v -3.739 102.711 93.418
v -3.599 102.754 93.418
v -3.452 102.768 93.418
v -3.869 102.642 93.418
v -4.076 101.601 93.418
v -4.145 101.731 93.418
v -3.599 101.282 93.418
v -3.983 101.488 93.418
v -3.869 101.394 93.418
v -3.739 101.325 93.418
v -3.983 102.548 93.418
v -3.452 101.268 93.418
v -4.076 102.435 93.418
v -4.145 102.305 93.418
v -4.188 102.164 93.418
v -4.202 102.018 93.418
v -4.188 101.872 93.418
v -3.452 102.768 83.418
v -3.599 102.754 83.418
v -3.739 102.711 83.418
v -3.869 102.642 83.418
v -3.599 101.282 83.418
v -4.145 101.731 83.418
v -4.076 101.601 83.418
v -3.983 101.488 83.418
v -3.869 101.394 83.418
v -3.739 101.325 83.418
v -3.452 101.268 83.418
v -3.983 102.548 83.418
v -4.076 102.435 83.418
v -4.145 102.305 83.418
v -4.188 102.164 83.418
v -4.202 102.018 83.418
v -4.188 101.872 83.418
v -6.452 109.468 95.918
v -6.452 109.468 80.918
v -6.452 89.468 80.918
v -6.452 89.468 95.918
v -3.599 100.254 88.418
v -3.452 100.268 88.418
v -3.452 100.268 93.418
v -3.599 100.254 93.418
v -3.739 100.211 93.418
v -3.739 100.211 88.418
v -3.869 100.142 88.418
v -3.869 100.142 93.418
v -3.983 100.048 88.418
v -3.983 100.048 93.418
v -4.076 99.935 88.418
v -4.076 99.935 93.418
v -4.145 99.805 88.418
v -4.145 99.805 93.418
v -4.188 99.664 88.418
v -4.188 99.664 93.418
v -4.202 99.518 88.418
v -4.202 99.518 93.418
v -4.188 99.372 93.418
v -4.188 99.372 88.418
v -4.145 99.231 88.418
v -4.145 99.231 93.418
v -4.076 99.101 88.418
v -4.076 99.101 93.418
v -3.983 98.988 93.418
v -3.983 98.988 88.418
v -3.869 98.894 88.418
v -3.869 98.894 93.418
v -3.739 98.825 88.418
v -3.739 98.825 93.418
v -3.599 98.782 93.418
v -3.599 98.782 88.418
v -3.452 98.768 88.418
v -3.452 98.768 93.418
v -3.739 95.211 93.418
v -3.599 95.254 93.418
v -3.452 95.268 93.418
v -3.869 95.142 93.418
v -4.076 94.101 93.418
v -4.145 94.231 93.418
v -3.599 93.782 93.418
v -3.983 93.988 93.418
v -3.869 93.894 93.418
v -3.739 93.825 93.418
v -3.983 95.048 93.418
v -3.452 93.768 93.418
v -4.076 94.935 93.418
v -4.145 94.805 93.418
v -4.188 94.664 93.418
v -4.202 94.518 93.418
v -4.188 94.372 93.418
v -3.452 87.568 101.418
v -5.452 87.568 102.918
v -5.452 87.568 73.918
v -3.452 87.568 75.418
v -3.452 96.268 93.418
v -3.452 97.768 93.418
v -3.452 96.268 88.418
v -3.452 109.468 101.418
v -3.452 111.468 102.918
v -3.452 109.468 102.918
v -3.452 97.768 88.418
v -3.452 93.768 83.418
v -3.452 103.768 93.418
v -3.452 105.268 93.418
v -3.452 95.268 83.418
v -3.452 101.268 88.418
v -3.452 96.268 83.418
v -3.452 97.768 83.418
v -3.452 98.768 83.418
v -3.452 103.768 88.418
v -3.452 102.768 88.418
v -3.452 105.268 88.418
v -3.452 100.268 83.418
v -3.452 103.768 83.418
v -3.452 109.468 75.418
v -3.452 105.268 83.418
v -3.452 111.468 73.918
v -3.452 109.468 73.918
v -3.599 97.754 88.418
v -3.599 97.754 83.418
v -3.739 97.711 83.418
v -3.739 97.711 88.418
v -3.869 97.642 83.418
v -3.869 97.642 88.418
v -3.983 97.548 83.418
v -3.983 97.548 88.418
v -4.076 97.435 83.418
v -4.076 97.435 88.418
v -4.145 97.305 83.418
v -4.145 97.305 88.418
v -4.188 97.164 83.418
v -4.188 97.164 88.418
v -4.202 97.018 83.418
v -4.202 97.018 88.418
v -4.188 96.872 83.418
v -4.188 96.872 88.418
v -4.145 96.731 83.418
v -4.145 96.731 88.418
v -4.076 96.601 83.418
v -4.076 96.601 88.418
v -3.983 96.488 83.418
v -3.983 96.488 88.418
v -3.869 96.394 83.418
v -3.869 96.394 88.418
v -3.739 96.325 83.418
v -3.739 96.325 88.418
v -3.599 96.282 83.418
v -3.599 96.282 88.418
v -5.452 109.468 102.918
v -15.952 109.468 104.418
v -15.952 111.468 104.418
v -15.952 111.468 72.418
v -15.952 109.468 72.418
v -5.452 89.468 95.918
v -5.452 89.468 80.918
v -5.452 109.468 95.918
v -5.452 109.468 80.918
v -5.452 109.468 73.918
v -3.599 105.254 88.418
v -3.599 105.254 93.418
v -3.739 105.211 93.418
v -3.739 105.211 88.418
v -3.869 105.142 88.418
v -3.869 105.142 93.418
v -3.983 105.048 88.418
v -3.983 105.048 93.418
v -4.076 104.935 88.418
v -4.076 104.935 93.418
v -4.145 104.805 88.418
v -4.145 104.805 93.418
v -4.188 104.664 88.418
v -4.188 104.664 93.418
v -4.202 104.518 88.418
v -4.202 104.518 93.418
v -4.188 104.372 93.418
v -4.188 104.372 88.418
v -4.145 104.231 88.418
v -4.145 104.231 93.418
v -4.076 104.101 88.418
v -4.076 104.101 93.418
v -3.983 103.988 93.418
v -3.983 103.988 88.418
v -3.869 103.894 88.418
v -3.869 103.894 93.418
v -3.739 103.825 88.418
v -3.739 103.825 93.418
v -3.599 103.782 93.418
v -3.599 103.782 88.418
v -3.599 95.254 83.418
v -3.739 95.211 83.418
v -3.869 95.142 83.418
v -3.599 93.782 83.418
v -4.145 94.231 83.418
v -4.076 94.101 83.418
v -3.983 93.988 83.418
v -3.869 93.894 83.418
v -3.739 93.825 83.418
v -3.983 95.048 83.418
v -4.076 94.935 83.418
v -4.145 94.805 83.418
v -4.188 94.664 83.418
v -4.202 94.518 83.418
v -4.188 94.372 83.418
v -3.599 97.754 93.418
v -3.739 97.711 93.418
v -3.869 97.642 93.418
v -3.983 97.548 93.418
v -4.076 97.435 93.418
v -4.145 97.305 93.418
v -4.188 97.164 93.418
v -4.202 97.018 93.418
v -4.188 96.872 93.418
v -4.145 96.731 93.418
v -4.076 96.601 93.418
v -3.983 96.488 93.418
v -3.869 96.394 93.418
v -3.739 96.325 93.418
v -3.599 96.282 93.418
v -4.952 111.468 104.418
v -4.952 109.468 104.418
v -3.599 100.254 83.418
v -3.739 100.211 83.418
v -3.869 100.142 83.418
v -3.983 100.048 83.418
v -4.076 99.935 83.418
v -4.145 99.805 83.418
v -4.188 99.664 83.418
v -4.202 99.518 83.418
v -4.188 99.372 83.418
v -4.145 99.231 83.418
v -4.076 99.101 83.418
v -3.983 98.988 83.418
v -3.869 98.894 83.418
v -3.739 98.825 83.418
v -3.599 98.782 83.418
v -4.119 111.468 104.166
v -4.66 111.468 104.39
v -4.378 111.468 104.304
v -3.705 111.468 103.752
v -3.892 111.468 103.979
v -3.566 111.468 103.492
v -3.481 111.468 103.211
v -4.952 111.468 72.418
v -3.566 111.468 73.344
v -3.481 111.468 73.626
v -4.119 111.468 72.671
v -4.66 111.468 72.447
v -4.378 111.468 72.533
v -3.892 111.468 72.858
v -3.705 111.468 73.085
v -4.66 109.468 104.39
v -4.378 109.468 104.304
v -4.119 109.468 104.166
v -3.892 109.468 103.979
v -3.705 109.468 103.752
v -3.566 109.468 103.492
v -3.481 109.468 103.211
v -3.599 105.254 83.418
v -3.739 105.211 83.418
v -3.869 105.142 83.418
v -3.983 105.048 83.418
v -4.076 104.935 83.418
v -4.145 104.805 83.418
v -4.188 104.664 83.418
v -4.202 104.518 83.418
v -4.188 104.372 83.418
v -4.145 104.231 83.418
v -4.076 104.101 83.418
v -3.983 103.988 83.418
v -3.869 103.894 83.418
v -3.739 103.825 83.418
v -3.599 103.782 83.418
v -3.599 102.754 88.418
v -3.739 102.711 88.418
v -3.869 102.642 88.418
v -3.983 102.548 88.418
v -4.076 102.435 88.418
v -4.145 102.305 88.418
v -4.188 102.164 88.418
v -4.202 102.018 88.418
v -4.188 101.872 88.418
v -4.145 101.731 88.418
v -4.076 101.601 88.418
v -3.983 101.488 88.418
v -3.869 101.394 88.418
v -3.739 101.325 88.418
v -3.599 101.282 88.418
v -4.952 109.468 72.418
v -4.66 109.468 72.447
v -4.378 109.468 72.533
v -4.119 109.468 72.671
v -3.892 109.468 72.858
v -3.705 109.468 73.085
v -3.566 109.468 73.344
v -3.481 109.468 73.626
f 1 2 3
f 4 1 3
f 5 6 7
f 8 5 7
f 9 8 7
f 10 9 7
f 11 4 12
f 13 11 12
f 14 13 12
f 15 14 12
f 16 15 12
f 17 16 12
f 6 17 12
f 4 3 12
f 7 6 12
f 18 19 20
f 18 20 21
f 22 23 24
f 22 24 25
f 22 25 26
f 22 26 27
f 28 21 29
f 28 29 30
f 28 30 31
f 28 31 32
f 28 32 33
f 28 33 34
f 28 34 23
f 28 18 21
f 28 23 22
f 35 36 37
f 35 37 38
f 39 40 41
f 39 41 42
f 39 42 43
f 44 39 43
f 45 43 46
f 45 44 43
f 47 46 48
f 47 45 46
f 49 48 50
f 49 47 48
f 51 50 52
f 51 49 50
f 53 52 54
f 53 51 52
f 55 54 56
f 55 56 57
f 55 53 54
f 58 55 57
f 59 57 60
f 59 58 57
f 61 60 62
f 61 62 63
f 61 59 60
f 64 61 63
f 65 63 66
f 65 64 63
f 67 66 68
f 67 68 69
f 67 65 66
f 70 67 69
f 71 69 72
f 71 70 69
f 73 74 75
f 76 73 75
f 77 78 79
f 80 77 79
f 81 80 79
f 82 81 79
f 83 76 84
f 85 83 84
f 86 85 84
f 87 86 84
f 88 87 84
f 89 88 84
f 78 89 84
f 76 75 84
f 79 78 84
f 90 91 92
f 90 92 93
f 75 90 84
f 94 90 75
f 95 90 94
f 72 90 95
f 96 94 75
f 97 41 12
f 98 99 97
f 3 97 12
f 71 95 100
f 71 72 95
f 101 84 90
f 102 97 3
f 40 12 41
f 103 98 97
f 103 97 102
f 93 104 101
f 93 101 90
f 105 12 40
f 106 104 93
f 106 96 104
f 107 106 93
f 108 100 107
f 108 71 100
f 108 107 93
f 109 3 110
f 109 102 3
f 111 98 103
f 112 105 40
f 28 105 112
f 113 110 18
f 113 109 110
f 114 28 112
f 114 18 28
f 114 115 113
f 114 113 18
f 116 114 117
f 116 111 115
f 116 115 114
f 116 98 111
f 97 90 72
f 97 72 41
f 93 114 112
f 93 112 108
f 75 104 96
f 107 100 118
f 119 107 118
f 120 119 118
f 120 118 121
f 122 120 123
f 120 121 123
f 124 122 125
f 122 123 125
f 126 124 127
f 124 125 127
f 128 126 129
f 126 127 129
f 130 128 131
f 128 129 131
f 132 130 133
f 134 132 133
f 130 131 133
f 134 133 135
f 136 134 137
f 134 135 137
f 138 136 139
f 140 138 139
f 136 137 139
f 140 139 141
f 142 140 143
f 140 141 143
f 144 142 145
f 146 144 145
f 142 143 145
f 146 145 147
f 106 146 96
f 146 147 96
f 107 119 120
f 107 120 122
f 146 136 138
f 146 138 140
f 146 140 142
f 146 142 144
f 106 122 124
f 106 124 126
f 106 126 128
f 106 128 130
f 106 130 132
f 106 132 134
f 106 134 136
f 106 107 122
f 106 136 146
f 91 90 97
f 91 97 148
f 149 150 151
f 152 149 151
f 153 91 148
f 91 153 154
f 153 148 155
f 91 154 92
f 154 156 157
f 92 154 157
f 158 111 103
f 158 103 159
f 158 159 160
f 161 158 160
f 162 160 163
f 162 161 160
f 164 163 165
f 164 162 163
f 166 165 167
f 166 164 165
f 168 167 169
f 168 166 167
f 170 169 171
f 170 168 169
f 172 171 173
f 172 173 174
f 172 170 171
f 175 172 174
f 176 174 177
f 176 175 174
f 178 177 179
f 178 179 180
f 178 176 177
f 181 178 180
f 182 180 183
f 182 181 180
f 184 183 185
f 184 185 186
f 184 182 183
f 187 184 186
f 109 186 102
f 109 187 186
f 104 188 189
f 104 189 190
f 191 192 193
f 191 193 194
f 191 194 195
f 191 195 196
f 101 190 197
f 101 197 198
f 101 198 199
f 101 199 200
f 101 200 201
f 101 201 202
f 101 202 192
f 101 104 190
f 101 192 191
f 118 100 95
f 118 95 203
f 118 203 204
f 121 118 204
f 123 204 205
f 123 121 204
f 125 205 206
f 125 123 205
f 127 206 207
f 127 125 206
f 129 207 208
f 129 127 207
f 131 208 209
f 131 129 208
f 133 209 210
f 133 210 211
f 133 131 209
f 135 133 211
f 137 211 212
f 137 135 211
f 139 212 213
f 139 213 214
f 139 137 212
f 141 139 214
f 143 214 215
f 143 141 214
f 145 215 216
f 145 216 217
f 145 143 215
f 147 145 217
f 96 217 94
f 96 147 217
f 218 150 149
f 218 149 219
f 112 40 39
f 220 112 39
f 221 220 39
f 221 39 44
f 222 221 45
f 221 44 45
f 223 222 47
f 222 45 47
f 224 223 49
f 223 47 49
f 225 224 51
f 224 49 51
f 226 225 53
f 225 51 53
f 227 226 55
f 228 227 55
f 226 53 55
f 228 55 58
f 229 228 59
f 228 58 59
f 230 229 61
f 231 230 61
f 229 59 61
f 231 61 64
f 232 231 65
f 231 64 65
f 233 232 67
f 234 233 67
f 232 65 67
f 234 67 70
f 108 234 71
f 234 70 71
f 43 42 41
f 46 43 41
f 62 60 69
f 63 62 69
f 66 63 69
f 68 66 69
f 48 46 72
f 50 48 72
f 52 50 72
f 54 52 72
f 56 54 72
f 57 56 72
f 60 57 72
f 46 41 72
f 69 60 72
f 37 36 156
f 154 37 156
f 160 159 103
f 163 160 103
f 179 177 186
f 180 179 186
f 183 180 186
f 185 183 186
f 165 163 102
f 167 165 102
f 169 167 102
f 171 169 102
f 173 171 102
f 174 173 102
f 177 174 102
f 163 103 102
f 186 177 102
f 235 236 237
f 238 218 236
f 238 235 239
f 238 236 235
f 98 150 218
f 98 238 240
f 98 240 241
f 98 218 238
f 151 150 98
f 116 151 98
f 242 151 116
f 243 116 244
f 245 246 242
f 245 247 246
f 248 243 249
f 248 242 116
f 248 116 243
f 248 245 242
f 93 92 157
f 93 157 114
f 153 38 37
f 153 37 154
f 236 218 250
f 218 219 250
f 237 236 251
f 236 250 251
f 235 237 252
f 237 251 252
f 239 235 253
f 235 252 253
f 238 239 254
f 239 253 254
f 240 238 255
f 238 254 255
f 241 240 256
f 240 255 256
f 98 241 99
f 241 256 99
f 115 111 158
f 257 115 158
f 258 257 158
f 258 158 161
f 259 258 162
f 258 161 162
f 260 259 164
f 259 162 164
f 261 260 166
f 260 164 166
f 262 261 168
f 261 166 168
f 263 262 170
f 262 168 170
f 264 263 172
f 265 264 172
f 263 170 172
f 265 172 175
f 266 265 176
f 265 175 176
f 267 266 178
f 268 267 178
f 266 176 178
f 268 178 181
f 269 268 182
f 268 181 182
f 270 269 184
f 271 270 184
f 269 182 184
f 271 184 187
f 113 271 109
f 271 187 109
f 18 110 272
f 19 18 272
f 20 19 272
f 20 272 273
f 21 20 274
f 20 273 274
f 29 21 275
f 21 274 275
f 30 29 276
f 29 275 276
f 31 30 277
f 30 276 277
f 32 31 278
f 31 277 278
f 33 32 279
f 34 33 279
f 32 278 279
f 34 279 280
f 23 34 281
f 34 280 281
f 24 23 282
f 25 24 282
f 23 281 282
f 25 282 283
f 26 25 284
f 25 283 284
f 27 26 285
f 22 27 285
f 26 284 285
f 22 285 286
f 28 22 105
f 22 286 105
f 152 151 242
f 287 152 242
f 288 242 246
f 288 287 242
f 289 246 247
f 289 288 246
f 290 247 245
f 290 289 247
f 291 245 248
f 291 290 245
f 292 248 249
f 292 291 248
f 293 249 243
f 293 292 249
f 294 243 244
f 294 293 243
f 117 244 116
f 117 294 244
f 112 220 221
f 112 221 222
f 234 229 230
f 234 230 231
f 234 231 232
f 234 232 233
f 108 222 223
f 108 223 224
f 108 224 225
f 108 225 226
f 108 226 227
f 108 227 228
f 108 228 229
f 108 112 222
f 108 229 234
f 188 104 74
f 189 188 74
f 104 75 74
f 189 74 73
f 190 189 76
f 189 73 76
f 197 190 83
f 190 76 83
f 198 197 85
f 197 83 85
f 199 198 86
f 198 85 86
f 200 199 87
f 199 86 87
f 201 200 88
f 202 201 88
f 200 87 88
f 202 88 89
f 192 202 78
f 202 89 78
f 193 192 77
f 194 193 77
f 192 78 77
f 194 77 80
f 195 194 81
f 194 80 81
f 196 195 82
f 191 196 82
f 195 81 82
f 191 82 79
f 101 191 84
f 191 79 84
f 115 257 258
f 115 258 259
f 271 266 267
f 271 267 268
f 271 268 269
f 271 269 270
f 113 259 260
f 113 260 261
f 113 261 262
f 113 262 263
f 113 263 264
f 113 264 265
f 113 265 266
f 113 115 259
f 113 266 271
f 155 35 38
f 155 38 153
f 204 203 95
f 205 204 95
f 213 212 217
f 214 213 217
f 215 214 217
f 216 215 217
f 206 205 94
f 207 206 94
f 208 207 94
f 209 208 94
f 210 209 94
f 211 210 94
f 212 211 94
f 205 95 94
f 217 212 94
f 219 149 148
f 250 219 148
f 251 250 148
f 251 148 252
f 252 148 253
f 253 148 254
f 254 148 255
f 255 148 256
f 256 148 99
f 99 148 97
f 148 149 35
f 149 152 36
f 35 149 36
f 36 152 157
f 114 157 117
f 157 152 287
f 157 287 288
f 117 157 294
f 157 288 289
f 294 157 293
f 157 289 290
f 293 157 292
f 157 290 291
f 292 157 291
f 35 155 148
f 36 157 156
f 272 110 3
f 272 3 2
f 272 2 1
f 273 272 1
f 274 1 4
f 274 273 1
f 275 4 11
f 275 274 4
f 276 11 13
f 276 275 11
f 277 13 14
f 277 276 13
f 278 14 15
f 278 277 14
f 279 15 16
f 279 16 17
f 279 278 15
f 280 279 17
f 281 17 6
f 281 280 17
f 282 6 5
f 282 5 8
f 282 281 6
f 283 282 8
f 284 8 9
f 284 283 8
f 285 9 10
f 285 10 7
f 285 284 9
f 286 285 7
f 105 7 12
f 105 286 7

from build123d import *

# Parameters (mm, degrees)
CROQUIS1_W              = 12.5
CROQUIS1_H              = 32
SALIENTE_EXTRUIR1_DEPTH = 2
SALIENTE_EXTRUIR2_DEPTH = 21.9
CROQUIS5_W              = 1
CROQUIS5_H              = 15
SALIENTE_EXTRUIR4_DEPTH = 20
CROQUIS4_R              = 0.75
CORTAR_EXTRUIR1_DEPTH   = 5
REDONDEO1_R             = 1.5


with BuildPart() as part:
    # Croquis1 → Saliente-Extruir1 (new body)
    with BuildSketch(Plane(origin=(0, 111.467949425, 0), x_dir=(1, 0, 0), z_dir=(0, 1, 0))):
        with Locations((-9.702229413, -88.418391236)):
            Rectangle(CROQUIS1_W, CROQUIS1_H)
    extrude(amount=-SALIENTE_EXTRUIR1_DEPTH)

    # Croquis2 → Saliente-Extruir2 (add)
    with BuildSketch(Plane.XZ.offset(-109.467949425)):
        Polygon((-3.452229413, 101.418391236), (-5.452229413, 102.918391236), (-5.452229413, 73.918391236), (-3.452229413, 75.418391236), align=None)
    extrude(amount=SALIENTE_EXTRUIR2_DEPTH)

    # Croquis5 → Saliente-Extruir4 (add)
    with BuildSketch(Plane.XZ.offset(-109.467949425)):
        with Locations((-5.952229413, 88.418391236)):
            Rectangle(CROQUIS5_W, CROQUIS5_H)
    extrude(amount=SALIENTE_EXTRUIR4_DEPTH)

    # Croquis4 → Cortar-Extruir1 (cut, symmetric)
    with BuildSketch(Plane(origin=(0, 0, 88.418391236), x_dir=(0, -1, 0), z_dir=(0, 0, 1))):
        with Locations((-104.517949425, -3.452229413)):
            Circle(CROQUIS4_R)
        with Locations((-102.017949425, -3.452229413)):
            Circle(CROQUIS4_R)
        with Locations((-99.517949425, -3.452229413)):
            Circle(CROQUIS4_R)
        with Locations((-97.017949425, -3.452229413)):
            Circle(CROQUIS4_R)
        with Locations((-94.517949425, -3.452229413)):
            Circle(CROQUIS4_R)
    extrude(amount=CORTAR_EXTRUIR1_DEPTH, both=True, mode=Mode.SUBTRACT)

    # Redondeo1
    redondeo1_edges = [part.edges().sort_by_distance(p)[0] for p in [
        (-3.452229413, 110.467949425, 72.418391236),
        (-3.452229413, 110.467949425, 104.418391236),
    ]]
    fillet(redondeo1_edges, radius=REDONDEO1_R)


solid = part.part
